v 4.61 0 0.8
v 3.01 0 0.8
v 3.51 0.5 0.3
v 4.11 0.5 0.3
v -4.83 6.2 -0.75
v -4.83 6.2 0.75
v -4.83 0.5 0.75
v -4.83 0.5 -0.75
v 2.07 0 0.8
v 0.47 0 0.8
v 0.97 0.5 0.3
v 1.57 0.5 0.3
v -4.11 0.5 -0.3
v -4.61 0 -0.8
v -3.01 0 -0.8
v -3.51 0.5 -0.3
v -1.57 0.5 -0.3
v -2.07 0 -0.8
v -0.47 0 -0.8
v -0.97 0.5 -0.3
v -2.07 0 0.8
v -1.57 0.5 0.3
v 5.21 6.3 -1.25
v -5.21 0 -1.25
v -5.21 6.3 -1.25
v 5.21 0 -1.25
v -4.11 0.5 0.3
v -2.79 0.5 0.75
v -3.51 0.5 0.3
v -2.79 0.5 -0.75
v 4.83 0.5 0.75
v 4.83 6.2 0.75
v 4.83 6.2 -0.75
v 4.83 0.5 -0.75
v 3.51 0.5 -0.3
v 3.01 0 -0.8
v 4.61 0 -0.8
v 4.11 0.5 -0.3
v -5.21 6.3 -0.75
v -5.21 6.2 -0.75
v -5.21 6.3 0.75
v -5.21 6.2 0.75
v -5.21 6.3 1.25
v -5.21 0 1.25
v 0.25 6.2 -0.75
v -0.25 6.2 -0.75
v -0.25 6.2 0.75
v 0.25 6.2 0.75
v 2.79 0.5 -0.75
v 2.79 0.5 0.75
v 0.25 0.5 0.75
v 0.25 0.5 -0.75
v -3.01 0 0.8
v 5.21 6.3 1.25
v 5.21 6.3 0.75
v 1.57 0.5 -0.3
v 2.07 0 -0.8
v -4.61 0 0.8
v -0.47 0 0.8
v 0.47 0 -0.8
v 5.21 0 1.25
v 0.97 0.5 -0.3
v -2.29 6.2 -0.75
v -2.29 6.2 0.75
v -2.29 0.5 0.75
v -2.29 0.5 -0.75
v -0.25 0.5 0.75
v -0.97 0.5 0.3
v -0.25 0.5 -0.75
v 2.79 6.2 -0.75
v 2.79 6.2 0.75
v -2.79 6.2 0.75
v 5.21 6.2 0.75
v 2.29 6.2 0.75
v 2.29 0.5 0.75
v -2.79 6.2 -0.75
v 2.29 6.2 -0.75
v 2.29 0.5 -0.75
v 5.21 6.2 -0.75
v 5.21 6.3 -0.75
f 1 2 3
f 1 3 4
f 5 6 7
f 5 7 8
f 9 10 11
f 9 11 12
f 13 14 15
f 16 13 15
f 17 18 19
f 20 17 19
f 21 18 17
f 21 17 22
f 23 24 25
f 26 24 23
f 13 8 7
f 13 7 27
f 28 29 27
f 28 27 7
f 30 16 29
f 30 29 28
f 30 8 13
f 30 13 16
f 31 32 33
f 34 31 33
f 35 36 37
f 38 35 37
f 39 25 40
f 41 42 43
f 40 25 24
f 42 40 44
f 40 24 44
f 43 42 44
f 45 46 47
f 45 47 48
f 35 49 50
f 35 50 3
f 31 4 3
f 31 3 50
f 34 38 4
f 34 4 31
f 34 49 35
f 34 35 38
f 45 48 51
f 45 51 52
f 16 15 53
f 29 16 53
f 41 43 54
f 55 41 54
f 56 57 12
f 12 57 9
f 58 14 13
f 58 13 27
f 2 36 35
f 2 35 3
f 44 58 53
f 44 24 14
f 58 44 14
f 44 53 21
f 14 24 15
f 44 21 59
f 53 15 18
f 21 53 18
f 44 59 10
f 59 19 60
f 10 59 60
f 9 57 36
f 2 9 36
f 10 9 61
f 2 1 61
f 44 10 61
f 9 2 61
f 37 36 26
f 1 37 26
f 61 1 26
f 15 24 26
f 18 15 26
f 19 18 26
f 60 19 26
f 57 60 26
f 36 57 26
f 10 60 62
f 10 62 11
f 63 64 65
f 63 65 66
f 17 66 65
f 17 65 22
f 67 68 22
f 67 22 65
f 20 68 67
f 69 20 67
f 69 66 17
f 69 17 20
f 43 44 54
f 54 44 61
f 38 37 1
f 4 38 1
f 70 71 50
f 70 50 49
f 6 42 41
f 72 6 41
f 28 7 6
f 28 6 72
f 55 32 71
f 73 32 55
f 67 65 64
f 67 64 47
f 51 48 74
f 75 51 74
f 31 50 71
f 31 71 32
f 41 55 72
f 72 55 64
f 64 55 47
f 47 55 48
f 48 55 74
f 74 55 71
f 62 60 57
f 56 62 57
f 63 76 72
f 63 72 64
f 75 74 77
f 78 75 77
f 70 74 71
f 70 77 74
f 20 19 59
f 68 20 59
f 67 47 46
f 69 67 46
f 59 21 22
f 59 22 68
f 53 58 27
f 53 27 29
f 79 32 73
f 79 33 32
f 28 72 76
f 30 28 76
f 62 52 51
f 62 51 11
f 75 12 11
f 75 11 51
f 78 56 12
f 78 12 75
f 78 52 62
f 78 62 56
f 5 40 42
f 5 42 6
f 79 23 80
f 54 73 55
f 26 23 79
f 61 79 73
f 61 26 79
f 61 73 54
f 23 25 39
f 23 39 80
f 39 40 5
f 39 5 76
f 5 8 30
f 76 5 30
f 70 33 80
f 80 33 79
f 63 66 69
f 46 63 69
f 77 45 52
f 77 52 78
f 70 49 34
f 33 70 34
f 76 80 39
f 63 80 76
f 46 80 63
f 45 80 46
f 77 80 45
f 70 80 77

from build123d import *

# Parameters (mm, degrees)
SKETCH1_W                 = 10.42
SKETCH1_H                 = 2.5
BOSS_EXTRUDE1_DEPTH       = 6.2
SKETCH2_W                 = 2.04
SKETCH2_H                 = 1.5
CUT_EXTRUDE1_DEPTH        = 5.7
SKETCH3_W                 = 1.6
SKETCH3_H                 = 1.6
CUT_EXTRUDE2_DEPTH        = 0.5
CUT_EXTRUDE2_DRAFT        = -45
LPATTERN1_COUNT           = 4
LPATTERN1_PITCH           = 2.54
LPATTERN1_COPY_1_SKETCH_W = 1.6
LPATTERN1_COPY_1_SKETCH_H = 1.6
LPATTERN1_COPY_1_DEPTH    = 0.5
LPATTERN1_COPY_1_DRAFT    = -45
LPATTERN1_COPY_2_SKETCH_W = 1.6
LPATTERN1_COPY_2_SKETCH_H = 1.6
LPATTERN1_COPY_2_DEPTH    = 0.5
LPATTERN1_COPY_2_DRAFT    = -45
LPATTERN1_COPY_3_SKETCH_W = 1.6
LPATTERN1_COPY_3_SKETCH_H = 1.6
LPATTERN1_COPY_3_DEPTH    = 0.5
LPATTERN1_COPY_3_DRAFT    = -45
SKETCH4_W                 = 10.42
SKETCH4_H                 = 0.5
BOSS_EXTRUDE2_DEPTH       = 0.1


with BuildPart() as part:
    # Sketch1 → Boss-Extrude1 (new body)
    with BuildSketch(Plane(origin=(0, 0, 0), x_dir=(1, 0, 0), z_dir=(0, 1, 0))):
        Rectangle(SKETCH1_W, SKETCH1_H)
    extrude(amount=BOSS_EXTRUDE1_DEPTH)

    # Sketch2 → Cut-Extrude1 (cut)
    with BuildSketch(Plane(origin=(0, 6.2, 0), x_dir=(1, 0, 0), z_dir=(0, 1, 0))):
        with Locations((-3.81, 0)):
            Rectangle(SKETCH2_W, SKETCH2_H)
    cut_extrude1 = extrude(amount=-CUT_EXTRUDE1_DEPTH, mode=Mode.SUBTRACT)


with BuildPart() as cut_extrude2_tool:
    # Sketch3 → Cut-Extrude2 (with draft: the straight prism first)
    with BuildSketch(Plane.XZ):
        with Locations((-3.81, 0)):
            Rectangle(SKETCH3_W, SKETCH3_H)
    extrude(amount=-CUT_EXTRUDE2_DEPTH)
    # Cut-Extrude2: the draft: its side faces are tilted about the plane it starts from
    cut_extrude2_sides = [cut_extrude2_tool.faces().sort_by_distance(p)[0] for p in [
        (-3.81, 0.25, -0.8),
        (-3.01, 0.25, 0),
        (-3.81, 0.25, 0.8),
        (-4.61, 0.25, 0),
    ]]
    draft(cut_extrude2_sides, Plane.XZ, CUT_EXTRUDE2_DRAFT)


with BuildPart() as part_1:
    add(part.part)

    # Cut-Extrude2: cut by cut_extrude2_tool
    add(cut_extrude2_tool.part, mode=Mode.SUBTRACT)

    # LPattern1: Cut-Extrude1 ×4
    with Locations(*[(i * LPATTERN1_PITCH, 0, 0) for i in range(1, LPATTERN1_COUNT)]):
        add(cut_extrude1, mode=Mode.SUBTRACT)


with BuildPart() as lpattern1_copy_1_tool:
    # LPattern1 copy 1 sketch → LPattern1 copy 1 (with draft: the straight prism first)
    with BuildSketch(Plane(origin=(2.54, 0, 0), x_dir=(1, 0, 0), z_dir=(0, -1, 0))):
        with Locations((-3.81, 0)):
            Rectangle(LPATTERN1_COPY_1_SKETCH_W, LPATTERN1_COPY_1_SKETCH_H)
    extrude(amount=-LPATTERN1_COPY_1_DEPTH)
    # LPattern1 copy 1: the draft: its side faces are tilted about the plane it starts from
    lpattern1_copy_1_sides = [lpattern1_copy_1_tool.faces().sort_by_distance(p)[0] for p in [
        (-1.27, 0.25, -0.8),
        (-0.47, 0.25, 0),
        (-1.27, 0.25, 0.8),
        (-2.07, 0.25, 0),
    ]]
    draft(lpattern1_copy_1_sides, Plane(origin=(2.54, 0, 0), x_dir=(1, 0, 0), z_dir=(0, -1, 0)), LPATTERN1_COPY_1_DRAFT)


with BuildPart() as part_2:
    add(part_1.part)

    # LPattern1 copy 1: cut by lpattern1_copy_1_tool
    add(lpattern1_copy_1_tool.part, mode=Mode.SUBTRACT)


with BuildPart() as lpattern1_copy_2_tool:
    # LPattern1 copy 2 sketch → LPattern1 copy 2 (with draft: the straight prism first)
    with BuildSketch(Plane(origin=(5.08, 0, 0), x_dir=(1, 0, 0), z_dir=(0, -1, 0))):
        with Locations((-3.81, 0)):
            Rectangle(LPATTERN1_COPY_2_SKETCH_W, LPATTERN1_COPY_2_SKETCH_H)
    extrude(amount=-LPATTERN1_COPY_2_DEPTH)
    # LPattern1 copy 2: the draft: its side faces are tilted about the plane it starts from
    lpattern1_copy_2_sides = [lpattern1_copy_2_tool.faces().sort_by_distance(p)[0] for p in [
        (1.27, 0.25, -0.8),
        (2.07, 0.25, 0),
        (1.27, 0.25, 0.8),
        (0.47, 0.25, 0),
    ]]
    draft(lpattern1_copy_2_sides, Plane(origin=(5.08, 0, 0), x_dir=(1, 0, 0), z_dir=(0, -1, 0)), LPATTERN1_COPY_2_DRAFT)


with BuildPart() as part_3:
    add(part_2.part)

    # LPattern1 copy 2: cut by lpattern1_copy_2_tool
    add(lpattern1_copy_2_tool.part, mode=Mode.SUBTRACT)


with BuildPart() as lpattern1_copy_3_tool:
    # LPattern1 copy 3 sketch → LPattern1 copy 3 (with draft: the straight prism first)
    with BuildSketch(Plane(origin=(7.62, 0, 0), x_dir=(1, 0, 0), z_dir=(0, -1, 0))):
        with Locations((-3.81, 0)):
            Rectangle(LPATTERN1_COPY_3_SKETCH_W, LPATTERN1_COPY_3_SKETCH_H)
    extrude(amount=-LPATTERN1_COPY_3_DEPTH)
    # LPattern1 copy 3: the draft: its side faces are tilted about the plane it starts from
    lpattern1_copy_3_sides = [lpattern1_copy_3_tool.faces().sort_by_distance(p)[0] for p in [
        (3.81, 0.25, -0.8),
        (4.61, 0.25, 0),
        (3.81, 0.25, 0.8),
        (3.01, 0.25, 0),
    ]]
    draft(lpattern1_copy_3_sides, Plane(origin=(7.62, 0, 0), x_dir=(1, 0, 0), z_dir=(0, -1, 0)), LPATTERN1_COPY_3_DRAFT)


with BuildPart() as part_4:
    add(part_3.part)

    # LPattern1 copy 3: cut by lpattern1_copy_3_tool
    add(lpattern1_copy_3_tool.part, mode=Mode.SUBTRACT)

    # Sketch4 → Boss-Extrude2 (add)
    with BuildSketch(Plane(origin=(0, 6.2, 0), x_dir=(1, 0, 0), z_dir=(0, 1, 0))):
        with Locations((0, 1)):
            Rectangle(SKETCH4_W, SKETCH4_H)
    boss_extrude2 = extrude(amount=BOSS_EXTRUDE2_DEPTH)

    # Mirror1: Boss-Extrude2 across plane
    add(boss_extrude2.mirror(Plane.XY))


solid = part_4.part
